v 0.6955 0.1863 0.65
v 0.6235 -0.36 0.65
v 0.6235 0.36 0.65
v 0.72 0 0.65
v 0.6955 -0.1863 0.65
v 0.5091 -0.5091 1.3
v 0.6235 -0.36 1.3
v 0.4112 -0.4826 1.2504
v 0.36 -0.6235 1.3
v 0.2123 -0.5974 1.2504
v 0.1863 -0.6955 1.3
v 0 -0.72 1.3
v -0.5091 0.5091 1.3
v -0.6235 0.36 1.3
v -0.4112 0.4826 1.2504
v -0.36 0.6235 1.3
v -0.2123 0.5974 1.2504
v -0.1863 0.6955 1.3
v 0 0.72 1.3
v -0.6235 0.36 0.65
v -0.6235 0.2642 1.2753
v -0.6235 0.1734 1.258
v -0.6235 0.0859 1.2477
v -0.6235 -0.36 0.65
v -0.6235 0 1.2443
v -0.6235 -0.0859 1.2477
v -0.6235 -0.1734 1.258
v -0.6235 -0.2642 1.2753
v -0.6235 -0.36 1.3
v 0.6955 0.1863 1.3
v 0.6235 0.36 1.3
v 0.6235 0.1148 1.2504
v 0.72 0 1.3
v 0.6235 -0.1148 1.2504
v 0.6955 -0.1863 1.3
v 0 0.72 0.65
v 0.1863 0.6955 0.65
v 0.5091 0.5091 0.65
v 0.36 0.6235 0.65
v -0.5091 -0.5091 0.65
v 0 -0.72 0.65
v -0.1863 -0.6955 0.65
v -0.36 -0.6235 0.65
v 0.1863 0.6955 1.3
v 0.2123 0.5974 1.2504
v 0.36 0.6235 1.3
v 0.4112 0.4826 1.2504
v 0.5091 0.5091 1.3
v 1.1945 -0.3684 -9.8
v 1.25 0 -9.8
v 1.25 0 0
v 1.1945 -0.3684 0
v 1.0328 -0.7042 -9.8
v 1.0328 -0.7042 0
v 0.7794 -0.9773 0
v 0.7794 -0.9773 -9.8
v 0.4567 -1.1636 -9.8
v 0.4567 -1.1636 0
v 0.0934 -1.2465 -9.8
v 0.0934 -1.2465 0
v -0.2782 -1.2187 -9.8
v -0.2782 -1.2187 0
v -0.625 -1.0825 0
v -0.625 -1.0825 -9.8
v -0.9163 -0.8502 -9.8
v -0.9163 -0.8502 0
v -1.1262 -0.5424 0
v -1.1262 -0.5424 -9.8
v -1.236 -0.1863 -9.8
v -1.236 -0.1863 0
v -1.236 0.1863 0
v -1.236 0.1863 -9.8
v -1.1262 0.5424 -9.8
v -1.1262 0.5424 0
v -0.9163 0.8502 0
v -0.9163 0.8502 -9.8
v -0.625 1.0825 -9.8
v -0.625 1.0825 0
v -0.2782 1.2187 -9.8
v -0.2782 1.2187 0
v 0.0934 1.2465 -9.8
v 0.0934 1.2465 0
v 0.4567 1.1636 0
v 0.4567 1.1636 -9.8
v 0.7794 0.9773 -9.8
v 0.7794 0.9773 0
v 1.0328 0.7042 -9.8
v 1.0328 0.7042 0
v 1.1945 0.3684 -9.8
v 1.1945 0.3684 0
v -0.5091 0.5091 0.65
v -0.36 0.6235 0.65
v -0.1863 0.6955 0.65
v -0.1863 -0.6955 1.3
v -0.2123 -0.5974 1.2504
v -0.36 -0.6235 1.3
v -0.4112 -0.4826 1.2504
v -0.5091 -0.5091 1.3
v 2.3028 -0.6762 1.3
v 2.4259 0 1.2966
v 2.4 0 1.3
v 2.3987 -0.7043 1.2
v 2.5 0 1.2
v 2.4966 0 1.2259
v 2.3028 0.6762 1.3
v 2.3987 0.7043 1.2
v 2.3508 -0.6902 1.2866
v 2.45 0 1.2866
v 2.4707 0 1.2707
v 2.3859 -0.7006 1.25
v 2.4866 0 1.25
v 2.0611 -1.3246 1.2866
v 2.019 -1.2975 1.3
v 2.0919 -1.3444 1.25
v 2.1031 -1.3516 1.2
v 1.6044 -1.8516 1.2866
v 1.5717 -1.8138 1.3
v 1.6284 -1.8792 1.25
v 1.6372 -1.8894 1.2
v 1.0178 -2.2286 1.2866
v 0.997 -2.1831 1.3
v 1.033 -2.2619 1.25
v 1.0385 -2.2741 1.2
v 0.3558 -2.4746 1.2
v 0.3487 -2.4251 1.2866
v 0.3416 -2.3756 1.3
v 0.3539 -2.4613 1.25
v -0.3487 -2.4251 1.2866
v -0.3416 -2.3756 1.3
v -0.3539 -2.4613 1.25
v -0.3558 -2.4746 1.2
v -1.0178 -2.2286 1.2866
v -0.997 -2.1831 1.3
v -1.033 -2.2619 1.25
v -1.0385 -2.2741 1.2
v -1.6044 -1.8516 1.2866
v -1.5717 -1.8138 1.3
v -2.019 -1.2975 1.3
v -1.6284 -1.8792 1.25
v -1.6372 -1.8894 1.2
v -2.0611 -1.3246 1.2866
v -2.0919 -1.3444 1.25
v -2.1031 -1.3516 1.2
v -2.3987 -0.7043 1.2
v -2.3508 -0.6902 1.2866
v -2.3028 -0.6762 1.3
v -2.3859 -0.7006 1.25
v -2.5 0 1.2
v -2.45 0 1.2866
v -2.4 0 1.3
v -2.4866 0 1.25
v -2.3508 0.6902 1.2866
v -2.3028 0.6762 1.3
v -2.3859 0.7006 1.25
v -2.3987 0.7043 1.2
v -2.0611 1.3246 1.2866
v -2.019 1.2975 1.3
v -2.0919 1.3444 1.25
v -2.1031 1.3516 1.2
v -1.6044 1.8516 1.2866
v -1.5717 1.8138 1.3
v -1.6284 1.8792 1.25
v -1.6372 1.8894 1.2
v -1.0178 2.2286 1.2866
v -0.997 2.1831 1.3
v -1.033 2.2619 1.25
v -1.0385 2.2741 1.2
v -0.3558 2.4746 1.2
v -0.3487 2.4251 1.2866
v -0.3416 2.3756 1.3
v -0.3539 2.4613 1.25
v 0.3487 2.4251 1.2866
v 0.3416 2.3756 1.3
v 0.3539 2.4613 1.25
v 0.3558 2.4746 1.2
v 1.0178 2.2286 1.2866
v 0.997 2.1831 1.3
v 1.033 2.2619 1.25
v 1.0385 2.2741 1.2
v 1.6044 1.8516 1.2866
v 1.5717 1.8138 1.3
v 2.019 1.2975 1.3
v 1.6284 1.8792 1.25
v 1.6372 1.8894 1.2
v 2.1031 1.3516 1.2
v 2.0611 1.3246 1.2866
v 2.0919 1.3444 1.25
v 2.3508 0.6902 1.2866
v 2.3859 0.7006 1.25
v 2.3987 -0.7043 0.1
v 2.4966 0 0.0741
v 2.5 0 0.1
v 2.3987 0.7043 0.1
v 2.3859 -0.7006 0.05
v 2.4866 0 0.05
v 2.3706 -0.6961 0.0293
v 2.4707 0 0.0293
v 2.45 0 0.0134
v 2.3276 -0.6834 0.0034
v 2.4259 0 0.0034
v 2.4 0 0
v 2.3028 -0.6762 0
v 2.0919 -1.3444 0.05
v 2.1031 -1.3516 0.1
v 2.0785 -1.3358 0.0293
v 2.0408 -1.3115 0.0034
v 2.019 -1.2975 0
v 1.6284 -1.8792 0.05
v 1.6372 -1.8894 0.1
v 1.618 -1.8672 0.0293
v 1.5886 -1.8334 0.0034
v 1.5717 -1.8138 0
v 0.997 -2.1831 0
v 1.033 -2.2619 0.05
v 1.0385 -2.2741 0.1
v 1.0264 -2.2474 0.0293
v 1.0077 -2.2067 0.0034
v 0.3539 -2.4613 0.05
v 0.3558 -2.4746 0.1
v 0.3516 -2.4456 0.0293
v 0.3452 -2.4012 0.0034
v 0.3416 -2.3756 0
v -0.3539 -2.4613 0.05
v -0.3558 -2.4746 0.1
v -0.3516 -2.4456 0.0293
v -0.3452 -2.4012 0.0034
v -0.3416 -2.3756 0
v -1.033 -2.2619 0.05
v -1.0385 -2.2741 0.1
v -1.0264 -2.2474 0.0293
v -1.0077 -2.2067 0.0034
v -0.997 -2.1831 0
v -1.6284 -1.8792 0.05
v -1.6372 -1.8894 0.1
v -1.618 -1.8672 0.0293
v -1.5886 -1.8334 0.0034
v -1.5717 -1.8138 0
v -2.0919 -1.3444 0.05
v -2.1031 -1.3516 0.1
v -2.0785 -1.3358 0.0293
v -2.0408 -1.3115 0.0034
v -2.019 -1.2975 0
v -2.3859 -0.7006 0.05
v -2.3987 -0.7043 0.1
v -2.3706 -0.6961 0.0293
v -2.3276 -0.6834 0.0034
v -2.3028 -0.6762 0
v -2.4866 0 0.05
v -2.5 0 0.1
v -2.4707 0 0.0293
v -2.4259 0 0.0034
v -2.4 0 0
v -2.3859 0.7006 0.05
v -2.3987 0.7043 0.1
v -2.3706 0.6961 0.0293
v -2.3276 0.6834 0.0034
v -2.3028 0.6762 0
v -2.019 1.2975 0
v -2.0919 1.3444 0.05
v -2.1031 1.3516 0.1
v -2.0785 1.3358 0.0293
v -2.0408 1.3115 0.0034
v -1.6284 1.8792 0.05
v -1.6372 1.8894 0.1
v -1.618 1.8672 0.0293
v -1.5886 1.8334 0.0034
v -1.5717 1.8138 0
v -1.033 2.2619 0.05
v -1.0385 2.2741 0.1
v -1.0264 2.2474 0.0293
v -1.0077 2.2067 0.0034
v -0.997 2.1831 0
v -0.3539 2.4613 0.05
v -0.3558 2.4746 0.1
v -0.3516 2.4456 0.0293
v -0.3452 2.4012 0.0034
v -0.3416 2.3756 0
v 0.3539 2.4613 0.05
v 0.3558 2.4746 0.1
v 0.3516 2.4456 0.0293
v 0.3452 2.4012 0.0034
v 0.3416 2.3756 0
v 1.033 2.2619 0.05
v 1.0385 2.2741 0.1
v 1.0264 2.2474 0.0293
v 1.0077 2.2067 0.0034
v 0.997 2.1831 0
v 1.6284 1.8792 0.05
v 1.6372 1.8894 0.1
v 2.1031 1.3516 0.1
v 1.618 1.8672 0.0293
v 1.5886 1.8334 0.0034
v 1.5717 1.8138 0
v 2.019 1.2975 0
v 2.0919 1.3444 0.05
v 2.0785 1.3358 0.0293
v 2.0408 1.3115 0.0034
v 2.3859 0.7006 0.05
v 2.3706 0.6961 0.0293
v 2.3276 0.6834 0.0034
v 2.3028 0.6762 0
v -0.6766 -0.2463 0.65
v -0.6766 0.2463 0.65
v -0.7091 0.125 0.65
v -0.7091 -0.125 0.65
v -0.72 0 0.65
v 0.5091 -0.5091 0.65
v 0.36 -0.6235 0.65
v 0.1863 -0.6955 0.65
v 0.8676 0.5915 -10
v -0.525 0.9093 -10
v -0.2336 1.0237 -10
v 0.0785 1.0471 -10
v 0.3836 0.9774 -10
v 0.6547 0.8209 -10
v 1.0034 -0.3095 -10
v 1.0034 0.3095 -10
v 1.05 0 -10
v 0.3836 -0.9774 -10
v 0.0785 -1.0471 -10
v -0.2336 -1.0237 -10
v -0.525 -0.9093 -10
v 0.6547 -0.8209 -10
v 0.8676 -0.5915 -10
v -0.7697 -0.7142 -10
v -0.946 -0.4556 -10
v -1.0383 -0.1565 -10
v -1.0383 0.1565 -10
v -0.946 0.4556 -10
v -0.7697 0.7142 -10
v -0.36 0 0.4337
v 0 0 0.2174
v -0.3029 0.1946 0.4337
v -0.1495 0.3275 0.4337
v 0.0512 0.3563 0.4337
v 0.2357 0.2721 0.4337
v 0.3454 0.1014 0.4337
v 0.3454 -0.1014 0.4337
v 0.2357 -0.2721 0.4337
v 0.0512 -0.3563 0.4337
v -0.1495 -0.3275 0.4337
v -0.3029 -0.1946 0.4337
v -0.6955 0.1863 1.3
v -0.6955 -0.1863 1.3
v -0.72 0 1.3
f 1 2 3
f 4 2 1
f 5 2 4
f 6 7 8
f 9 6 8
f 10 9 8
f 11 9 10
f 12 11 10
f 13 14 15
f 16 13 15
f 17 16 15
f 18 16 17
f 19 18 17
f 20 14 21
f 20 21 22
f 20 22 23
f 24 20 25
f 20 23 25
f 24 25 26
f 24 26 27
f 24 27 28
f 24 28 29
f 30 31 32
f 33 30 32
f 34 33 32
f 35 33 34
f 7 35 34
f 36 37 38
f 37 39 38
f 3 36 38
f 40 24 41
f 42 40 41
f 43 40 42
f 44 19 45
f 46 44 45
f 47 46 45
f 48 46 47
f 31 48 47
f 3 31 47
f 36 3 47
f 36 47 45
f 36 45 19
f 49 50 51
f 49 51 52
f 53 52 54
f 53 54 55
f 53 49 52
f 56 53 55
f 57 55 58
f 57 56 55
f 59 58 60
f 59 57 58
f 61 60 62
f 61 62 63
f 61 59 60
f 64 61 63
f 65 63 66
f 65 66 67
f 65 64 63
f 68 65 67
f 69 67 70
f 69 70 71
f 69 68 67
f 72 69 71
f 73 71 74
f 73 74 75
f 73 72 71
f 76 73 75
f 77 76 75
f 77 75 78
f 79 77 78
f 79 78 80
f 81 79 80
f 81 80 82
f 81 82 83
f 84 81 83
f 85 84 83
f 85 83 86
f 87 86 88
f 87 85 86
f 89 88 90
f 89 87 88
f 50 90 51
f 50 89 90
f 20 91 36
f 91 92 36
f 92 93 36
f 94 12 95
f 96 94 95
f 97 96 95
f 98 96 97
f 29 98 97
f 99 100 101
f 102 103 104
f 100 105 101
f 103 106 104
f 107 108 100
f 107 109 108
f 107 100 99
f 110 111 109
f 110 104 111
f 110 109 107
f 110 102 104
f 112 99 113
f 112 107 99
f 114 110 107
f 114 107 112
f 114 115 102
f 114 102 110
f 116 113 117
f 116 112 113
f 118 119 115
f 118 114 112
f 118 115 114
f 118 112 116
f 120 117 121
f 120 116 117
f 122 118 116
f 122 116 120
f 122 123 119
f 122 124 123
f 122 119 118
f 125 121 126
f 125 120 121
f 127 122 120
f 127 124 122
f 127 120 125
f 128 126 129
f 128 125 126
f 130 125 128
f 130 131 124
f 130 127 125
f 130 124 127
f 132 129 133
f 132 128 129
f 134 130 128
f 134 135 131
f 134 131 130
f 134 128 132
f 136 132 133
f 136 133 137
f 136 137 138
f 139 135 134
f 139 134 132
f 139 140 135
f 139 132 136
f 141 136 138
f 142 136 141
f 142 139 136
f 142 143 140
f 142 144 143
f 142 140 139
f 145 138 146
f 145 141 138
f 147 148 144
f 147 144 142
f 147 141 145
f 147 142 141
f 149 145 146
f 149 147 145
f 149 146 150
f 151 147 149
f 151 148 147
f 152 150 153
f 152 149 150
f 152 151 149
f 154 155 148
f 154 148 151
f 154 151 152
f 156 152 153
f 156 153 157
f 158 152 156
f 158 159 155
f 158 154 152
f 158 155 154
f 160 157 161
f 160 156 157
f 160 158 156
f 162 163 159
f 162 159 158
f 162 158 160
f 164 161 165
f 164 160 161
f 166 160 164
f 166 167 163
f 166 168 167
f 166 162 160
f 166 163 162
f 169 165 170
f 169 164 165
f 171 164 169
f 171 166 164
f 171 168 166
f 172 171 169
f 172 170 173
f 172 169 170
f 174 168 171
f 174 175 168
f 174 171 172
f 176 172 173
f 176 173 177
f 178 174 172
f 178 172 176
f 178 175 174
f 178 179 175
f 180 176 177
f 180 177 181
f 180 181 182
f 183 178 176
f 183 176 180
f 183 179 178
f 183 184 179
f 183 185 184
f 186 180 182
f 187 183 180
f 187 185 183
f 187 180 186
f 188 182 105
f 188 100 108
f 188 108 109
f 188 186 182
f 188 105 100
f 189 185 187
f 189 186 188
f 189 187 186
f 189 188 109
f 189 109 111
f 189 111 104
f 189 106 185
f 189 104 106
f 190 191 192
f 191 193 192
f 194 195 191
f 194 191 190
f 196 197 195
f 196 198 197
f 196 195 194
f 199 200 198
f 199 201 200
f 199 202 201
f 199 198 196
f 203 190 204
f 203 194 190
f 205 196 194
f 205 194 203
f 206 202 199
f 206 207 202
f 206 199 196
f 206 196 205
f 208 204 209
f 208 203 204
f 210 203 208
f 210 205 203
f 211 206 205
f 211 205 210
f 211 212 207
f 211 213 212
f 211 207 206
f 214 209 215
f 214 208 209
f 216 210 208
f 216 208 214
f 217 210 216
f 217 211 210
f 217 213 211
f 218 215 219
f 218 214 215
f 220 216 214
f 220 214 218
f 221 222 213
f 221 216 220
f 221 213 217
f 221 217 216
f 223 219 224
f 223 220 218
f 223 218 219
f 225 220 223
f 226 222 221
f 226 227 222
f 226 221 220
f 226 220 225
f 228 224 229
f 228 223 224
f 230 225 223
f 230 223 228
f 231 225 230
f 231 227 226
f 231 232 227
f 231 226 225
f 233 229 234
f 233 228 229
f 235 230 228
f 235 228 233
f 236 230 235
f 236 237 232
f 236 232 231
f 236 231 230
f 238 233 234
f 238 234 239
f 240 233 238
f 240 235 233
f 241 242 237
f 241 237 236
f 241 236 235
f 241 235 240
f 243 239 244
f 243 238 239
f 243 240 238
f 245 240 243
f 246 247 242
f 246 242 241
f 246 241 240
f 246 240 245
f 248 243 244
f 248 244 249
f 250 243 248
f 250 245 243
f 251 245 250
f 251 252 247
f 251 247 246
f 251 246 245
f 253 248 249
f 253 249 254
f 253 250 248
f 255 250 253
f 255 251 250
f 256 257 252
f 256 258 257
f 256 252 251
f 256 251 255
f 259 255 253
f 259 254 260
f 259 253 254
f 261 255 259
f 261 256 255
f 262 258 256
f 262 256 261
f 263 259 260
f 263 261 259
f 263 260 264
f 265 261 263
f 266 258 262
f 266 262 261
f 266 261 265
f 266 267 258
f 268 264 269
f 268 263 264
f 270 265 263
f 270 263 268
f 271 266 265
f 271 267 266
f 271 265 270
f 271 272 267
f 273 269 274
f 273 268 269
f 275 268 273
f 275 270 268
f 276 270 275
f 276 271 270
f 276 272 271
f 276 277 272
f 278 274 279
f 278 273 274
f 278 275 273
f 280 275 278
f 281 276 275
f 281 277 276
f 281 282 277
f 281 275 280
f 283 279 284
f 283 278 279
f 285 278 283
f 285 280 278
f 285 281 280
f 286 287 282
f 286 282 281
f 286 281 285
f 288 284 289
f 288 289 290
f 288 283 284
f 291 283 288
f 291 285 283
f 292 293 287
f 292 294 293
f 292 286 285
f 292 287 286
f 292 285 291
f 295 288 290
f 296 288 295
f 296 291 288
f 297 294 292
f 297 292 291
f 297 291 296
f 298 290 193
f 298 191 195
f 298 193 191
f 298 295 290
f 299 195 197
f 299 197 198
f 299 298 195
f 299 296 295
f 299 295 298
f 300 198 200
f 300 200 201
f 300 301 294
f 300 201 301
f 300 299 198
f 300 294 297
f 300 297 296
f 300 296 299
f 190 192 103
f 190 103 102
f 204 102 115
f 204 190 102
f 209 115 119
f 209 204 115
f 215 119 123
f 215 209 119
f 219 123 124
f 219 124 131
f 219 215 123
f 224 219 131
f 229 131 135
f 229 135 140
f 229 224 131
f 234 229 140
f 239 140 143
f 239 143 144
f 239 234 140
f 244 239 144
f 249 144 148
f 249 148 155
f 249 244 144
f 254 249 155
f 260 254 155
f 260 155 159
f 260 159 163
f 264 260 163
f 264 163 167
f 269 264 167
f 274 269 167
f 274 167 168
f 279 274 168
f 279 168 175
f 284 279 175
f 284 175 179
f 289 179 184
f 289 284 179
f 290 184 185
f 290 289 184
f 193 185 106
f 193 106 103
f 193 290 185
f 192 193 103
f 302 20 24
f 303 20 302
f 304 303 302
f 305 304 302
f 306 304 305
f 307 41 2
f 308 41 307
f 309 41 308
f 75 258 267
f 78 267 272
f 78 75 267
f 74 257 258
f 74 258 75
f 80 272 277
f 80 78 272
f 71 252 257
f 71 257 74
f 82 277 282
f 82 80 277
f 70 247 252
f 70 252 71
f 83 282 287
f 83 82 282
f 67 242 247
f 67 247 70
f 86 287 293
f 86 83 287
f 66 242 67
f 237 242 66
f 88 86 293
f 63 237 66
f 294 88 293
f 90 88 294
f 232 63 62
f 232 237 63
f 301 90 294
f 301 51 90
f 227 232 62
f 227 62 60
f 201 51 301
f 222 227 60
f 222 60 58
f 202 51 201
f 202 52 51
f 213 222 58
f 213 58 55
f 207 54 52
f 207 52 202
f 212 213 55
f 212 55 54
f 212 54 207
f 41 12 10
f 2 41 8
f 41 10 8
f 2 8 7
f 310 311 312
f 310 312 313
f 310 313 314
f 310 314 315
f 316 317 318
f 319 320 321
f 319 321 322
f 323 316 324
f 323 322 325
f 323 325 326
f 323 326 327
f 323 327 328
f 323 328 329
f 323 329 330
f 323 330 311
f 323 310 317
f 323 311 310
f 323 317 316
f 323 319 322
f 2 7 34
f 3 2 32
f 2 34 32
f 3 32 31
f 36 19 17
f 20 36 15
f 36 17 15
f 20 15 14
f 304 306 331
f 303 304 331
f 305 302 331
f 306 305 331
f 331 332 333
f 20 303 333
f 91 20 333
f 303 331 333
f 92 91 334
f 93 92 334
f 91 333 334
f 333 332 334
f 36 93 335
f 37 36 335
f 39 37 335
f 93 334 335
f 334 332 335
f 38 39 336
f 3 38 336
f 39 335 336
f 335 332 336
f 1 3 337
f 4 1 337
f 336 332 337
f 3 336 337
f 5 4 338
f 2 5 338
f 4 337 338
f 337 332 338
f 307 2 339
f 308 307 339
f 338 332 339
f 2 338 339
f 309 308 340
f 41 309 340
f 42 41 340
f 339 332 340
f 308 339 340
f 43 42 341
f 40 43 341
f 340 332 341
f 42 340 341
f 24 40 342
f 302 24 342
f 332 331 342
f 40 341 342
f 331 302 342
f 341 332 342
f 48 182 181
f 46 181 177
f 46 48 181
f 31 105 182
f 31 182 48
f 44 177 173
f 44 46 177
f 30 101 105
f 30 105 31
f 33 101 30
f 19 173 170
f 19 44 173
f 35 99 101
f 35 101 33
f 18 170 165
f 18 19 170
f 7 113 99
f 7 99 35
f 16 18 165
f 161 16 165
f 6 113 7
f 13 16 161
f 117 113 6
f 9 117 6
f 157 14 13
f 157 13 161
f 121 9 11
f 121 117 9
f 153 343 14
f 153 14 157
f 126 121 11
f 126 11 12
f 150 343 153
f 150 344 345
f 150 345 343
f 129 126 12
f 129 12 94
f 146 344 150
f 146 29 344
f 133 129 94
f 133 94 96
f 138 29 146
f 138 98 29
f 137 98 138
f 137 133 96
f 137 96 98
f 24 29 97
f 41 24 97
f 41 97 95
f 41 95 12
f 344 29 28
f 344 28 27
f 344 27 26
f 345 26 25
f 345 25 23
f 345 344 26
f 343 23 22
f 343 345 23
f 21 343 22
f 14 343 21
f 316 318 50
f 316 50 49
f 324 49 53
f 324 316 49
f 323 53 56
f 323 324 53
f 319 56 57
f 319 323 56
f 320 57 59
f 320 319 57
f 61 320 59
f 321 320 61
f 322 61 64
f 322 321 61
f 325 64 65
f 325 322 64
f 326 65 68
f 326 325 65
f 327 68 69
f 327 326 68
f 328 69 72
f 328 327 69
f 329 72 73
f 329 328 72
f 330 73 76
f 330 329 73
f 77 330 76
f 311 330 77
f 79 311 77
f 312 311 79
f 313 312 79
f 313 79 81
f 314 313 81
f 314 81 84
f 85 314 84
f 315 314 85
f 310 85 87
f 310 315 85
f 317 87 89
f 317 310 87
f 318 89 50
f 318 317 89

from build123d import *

# Parameters (mm, degrees)
CUT_EXTRUDE1_DEPTH = 0.65
FILLET1_R          = 0.1
CHAMFER1_SIZE      = 0.2


with BuildPart() as part:
    # Sketch2 → Revolve1 (revolve)
    with BuildSketch(Plane(origin=(0, 0, 0), x_dir=(0, 0, -1), z_dir=(1, 0, 0)), mode=Mode.PRIVATE) as revolve1_sk:
        Polygon((-1.3, 0), (-1.3, 2.5), (0, 2.5), (0, 1.25), (10, 1.25), (10, 0), align=None)
    revolve(revolve1_sk.sketch.rotate(Axis((0, 0, 1.3), (0, 0, -1)), 90), axis=Axis((0, 0, 1.3), (0, 0, -1)))

    # Sketch3 → Cut-Extrude1 (cut)
    with BuildSketch(Plane.XY.offset(1.3)):
        Polygon((0, 0.72), (-0.623538291, 0.36), (-0.623538291, -0.36), (0, -0.72), (0.623538291, -0.36), (0.623538291, 0.36), align=None)
    extrude(amount=-CUT_EXTRUDE1_DEPTH, mode=Mode.SUBTRACT)

    # Fillet1
    fillet1_edges = [part.edges().sort_by_distance(p)[0] for p in [
        (-2.5, 0, 0),
        (-2.5, 0, 1.3),
    ]]
    fillet(fillet1_edges, radius=FILLET1_R)

    # Chamfer1
    chamfer1_edges = [part.edges().sort_by_distance(p)[0] for p in [
        (-1.25, 0, -10),
    ]]
    chamfer(chamfer1_edges, length=CHAMFER1_SIZE)

    # Sketch4 → Cut-Revolve1 (revolve, cut)
    with BuildSketch(Plane(origin=(0, 0, 0), x_dir=(0, 0, -1), z_dir=(1, 0, 0)), mode=Mode.PRIVATE) as cut_revolve1_sk:
        Polygon((-0.65, 0.72), (-0.217380354, 0), (-0.65, 0), align=None)
        Polygon((-1.3, 0.72), (-1.3, 0.57), (-1.21339746, 0.57), align=None)
    revolve(cut_revolve1_sk.sketch.rotate(Axis((0, 0, 0), (0, 0, -1)), 270), axis=Axis((0, 0, 0), (0, 0, -1)), mode=Mode.SUBTRACT)


solid = part.part
